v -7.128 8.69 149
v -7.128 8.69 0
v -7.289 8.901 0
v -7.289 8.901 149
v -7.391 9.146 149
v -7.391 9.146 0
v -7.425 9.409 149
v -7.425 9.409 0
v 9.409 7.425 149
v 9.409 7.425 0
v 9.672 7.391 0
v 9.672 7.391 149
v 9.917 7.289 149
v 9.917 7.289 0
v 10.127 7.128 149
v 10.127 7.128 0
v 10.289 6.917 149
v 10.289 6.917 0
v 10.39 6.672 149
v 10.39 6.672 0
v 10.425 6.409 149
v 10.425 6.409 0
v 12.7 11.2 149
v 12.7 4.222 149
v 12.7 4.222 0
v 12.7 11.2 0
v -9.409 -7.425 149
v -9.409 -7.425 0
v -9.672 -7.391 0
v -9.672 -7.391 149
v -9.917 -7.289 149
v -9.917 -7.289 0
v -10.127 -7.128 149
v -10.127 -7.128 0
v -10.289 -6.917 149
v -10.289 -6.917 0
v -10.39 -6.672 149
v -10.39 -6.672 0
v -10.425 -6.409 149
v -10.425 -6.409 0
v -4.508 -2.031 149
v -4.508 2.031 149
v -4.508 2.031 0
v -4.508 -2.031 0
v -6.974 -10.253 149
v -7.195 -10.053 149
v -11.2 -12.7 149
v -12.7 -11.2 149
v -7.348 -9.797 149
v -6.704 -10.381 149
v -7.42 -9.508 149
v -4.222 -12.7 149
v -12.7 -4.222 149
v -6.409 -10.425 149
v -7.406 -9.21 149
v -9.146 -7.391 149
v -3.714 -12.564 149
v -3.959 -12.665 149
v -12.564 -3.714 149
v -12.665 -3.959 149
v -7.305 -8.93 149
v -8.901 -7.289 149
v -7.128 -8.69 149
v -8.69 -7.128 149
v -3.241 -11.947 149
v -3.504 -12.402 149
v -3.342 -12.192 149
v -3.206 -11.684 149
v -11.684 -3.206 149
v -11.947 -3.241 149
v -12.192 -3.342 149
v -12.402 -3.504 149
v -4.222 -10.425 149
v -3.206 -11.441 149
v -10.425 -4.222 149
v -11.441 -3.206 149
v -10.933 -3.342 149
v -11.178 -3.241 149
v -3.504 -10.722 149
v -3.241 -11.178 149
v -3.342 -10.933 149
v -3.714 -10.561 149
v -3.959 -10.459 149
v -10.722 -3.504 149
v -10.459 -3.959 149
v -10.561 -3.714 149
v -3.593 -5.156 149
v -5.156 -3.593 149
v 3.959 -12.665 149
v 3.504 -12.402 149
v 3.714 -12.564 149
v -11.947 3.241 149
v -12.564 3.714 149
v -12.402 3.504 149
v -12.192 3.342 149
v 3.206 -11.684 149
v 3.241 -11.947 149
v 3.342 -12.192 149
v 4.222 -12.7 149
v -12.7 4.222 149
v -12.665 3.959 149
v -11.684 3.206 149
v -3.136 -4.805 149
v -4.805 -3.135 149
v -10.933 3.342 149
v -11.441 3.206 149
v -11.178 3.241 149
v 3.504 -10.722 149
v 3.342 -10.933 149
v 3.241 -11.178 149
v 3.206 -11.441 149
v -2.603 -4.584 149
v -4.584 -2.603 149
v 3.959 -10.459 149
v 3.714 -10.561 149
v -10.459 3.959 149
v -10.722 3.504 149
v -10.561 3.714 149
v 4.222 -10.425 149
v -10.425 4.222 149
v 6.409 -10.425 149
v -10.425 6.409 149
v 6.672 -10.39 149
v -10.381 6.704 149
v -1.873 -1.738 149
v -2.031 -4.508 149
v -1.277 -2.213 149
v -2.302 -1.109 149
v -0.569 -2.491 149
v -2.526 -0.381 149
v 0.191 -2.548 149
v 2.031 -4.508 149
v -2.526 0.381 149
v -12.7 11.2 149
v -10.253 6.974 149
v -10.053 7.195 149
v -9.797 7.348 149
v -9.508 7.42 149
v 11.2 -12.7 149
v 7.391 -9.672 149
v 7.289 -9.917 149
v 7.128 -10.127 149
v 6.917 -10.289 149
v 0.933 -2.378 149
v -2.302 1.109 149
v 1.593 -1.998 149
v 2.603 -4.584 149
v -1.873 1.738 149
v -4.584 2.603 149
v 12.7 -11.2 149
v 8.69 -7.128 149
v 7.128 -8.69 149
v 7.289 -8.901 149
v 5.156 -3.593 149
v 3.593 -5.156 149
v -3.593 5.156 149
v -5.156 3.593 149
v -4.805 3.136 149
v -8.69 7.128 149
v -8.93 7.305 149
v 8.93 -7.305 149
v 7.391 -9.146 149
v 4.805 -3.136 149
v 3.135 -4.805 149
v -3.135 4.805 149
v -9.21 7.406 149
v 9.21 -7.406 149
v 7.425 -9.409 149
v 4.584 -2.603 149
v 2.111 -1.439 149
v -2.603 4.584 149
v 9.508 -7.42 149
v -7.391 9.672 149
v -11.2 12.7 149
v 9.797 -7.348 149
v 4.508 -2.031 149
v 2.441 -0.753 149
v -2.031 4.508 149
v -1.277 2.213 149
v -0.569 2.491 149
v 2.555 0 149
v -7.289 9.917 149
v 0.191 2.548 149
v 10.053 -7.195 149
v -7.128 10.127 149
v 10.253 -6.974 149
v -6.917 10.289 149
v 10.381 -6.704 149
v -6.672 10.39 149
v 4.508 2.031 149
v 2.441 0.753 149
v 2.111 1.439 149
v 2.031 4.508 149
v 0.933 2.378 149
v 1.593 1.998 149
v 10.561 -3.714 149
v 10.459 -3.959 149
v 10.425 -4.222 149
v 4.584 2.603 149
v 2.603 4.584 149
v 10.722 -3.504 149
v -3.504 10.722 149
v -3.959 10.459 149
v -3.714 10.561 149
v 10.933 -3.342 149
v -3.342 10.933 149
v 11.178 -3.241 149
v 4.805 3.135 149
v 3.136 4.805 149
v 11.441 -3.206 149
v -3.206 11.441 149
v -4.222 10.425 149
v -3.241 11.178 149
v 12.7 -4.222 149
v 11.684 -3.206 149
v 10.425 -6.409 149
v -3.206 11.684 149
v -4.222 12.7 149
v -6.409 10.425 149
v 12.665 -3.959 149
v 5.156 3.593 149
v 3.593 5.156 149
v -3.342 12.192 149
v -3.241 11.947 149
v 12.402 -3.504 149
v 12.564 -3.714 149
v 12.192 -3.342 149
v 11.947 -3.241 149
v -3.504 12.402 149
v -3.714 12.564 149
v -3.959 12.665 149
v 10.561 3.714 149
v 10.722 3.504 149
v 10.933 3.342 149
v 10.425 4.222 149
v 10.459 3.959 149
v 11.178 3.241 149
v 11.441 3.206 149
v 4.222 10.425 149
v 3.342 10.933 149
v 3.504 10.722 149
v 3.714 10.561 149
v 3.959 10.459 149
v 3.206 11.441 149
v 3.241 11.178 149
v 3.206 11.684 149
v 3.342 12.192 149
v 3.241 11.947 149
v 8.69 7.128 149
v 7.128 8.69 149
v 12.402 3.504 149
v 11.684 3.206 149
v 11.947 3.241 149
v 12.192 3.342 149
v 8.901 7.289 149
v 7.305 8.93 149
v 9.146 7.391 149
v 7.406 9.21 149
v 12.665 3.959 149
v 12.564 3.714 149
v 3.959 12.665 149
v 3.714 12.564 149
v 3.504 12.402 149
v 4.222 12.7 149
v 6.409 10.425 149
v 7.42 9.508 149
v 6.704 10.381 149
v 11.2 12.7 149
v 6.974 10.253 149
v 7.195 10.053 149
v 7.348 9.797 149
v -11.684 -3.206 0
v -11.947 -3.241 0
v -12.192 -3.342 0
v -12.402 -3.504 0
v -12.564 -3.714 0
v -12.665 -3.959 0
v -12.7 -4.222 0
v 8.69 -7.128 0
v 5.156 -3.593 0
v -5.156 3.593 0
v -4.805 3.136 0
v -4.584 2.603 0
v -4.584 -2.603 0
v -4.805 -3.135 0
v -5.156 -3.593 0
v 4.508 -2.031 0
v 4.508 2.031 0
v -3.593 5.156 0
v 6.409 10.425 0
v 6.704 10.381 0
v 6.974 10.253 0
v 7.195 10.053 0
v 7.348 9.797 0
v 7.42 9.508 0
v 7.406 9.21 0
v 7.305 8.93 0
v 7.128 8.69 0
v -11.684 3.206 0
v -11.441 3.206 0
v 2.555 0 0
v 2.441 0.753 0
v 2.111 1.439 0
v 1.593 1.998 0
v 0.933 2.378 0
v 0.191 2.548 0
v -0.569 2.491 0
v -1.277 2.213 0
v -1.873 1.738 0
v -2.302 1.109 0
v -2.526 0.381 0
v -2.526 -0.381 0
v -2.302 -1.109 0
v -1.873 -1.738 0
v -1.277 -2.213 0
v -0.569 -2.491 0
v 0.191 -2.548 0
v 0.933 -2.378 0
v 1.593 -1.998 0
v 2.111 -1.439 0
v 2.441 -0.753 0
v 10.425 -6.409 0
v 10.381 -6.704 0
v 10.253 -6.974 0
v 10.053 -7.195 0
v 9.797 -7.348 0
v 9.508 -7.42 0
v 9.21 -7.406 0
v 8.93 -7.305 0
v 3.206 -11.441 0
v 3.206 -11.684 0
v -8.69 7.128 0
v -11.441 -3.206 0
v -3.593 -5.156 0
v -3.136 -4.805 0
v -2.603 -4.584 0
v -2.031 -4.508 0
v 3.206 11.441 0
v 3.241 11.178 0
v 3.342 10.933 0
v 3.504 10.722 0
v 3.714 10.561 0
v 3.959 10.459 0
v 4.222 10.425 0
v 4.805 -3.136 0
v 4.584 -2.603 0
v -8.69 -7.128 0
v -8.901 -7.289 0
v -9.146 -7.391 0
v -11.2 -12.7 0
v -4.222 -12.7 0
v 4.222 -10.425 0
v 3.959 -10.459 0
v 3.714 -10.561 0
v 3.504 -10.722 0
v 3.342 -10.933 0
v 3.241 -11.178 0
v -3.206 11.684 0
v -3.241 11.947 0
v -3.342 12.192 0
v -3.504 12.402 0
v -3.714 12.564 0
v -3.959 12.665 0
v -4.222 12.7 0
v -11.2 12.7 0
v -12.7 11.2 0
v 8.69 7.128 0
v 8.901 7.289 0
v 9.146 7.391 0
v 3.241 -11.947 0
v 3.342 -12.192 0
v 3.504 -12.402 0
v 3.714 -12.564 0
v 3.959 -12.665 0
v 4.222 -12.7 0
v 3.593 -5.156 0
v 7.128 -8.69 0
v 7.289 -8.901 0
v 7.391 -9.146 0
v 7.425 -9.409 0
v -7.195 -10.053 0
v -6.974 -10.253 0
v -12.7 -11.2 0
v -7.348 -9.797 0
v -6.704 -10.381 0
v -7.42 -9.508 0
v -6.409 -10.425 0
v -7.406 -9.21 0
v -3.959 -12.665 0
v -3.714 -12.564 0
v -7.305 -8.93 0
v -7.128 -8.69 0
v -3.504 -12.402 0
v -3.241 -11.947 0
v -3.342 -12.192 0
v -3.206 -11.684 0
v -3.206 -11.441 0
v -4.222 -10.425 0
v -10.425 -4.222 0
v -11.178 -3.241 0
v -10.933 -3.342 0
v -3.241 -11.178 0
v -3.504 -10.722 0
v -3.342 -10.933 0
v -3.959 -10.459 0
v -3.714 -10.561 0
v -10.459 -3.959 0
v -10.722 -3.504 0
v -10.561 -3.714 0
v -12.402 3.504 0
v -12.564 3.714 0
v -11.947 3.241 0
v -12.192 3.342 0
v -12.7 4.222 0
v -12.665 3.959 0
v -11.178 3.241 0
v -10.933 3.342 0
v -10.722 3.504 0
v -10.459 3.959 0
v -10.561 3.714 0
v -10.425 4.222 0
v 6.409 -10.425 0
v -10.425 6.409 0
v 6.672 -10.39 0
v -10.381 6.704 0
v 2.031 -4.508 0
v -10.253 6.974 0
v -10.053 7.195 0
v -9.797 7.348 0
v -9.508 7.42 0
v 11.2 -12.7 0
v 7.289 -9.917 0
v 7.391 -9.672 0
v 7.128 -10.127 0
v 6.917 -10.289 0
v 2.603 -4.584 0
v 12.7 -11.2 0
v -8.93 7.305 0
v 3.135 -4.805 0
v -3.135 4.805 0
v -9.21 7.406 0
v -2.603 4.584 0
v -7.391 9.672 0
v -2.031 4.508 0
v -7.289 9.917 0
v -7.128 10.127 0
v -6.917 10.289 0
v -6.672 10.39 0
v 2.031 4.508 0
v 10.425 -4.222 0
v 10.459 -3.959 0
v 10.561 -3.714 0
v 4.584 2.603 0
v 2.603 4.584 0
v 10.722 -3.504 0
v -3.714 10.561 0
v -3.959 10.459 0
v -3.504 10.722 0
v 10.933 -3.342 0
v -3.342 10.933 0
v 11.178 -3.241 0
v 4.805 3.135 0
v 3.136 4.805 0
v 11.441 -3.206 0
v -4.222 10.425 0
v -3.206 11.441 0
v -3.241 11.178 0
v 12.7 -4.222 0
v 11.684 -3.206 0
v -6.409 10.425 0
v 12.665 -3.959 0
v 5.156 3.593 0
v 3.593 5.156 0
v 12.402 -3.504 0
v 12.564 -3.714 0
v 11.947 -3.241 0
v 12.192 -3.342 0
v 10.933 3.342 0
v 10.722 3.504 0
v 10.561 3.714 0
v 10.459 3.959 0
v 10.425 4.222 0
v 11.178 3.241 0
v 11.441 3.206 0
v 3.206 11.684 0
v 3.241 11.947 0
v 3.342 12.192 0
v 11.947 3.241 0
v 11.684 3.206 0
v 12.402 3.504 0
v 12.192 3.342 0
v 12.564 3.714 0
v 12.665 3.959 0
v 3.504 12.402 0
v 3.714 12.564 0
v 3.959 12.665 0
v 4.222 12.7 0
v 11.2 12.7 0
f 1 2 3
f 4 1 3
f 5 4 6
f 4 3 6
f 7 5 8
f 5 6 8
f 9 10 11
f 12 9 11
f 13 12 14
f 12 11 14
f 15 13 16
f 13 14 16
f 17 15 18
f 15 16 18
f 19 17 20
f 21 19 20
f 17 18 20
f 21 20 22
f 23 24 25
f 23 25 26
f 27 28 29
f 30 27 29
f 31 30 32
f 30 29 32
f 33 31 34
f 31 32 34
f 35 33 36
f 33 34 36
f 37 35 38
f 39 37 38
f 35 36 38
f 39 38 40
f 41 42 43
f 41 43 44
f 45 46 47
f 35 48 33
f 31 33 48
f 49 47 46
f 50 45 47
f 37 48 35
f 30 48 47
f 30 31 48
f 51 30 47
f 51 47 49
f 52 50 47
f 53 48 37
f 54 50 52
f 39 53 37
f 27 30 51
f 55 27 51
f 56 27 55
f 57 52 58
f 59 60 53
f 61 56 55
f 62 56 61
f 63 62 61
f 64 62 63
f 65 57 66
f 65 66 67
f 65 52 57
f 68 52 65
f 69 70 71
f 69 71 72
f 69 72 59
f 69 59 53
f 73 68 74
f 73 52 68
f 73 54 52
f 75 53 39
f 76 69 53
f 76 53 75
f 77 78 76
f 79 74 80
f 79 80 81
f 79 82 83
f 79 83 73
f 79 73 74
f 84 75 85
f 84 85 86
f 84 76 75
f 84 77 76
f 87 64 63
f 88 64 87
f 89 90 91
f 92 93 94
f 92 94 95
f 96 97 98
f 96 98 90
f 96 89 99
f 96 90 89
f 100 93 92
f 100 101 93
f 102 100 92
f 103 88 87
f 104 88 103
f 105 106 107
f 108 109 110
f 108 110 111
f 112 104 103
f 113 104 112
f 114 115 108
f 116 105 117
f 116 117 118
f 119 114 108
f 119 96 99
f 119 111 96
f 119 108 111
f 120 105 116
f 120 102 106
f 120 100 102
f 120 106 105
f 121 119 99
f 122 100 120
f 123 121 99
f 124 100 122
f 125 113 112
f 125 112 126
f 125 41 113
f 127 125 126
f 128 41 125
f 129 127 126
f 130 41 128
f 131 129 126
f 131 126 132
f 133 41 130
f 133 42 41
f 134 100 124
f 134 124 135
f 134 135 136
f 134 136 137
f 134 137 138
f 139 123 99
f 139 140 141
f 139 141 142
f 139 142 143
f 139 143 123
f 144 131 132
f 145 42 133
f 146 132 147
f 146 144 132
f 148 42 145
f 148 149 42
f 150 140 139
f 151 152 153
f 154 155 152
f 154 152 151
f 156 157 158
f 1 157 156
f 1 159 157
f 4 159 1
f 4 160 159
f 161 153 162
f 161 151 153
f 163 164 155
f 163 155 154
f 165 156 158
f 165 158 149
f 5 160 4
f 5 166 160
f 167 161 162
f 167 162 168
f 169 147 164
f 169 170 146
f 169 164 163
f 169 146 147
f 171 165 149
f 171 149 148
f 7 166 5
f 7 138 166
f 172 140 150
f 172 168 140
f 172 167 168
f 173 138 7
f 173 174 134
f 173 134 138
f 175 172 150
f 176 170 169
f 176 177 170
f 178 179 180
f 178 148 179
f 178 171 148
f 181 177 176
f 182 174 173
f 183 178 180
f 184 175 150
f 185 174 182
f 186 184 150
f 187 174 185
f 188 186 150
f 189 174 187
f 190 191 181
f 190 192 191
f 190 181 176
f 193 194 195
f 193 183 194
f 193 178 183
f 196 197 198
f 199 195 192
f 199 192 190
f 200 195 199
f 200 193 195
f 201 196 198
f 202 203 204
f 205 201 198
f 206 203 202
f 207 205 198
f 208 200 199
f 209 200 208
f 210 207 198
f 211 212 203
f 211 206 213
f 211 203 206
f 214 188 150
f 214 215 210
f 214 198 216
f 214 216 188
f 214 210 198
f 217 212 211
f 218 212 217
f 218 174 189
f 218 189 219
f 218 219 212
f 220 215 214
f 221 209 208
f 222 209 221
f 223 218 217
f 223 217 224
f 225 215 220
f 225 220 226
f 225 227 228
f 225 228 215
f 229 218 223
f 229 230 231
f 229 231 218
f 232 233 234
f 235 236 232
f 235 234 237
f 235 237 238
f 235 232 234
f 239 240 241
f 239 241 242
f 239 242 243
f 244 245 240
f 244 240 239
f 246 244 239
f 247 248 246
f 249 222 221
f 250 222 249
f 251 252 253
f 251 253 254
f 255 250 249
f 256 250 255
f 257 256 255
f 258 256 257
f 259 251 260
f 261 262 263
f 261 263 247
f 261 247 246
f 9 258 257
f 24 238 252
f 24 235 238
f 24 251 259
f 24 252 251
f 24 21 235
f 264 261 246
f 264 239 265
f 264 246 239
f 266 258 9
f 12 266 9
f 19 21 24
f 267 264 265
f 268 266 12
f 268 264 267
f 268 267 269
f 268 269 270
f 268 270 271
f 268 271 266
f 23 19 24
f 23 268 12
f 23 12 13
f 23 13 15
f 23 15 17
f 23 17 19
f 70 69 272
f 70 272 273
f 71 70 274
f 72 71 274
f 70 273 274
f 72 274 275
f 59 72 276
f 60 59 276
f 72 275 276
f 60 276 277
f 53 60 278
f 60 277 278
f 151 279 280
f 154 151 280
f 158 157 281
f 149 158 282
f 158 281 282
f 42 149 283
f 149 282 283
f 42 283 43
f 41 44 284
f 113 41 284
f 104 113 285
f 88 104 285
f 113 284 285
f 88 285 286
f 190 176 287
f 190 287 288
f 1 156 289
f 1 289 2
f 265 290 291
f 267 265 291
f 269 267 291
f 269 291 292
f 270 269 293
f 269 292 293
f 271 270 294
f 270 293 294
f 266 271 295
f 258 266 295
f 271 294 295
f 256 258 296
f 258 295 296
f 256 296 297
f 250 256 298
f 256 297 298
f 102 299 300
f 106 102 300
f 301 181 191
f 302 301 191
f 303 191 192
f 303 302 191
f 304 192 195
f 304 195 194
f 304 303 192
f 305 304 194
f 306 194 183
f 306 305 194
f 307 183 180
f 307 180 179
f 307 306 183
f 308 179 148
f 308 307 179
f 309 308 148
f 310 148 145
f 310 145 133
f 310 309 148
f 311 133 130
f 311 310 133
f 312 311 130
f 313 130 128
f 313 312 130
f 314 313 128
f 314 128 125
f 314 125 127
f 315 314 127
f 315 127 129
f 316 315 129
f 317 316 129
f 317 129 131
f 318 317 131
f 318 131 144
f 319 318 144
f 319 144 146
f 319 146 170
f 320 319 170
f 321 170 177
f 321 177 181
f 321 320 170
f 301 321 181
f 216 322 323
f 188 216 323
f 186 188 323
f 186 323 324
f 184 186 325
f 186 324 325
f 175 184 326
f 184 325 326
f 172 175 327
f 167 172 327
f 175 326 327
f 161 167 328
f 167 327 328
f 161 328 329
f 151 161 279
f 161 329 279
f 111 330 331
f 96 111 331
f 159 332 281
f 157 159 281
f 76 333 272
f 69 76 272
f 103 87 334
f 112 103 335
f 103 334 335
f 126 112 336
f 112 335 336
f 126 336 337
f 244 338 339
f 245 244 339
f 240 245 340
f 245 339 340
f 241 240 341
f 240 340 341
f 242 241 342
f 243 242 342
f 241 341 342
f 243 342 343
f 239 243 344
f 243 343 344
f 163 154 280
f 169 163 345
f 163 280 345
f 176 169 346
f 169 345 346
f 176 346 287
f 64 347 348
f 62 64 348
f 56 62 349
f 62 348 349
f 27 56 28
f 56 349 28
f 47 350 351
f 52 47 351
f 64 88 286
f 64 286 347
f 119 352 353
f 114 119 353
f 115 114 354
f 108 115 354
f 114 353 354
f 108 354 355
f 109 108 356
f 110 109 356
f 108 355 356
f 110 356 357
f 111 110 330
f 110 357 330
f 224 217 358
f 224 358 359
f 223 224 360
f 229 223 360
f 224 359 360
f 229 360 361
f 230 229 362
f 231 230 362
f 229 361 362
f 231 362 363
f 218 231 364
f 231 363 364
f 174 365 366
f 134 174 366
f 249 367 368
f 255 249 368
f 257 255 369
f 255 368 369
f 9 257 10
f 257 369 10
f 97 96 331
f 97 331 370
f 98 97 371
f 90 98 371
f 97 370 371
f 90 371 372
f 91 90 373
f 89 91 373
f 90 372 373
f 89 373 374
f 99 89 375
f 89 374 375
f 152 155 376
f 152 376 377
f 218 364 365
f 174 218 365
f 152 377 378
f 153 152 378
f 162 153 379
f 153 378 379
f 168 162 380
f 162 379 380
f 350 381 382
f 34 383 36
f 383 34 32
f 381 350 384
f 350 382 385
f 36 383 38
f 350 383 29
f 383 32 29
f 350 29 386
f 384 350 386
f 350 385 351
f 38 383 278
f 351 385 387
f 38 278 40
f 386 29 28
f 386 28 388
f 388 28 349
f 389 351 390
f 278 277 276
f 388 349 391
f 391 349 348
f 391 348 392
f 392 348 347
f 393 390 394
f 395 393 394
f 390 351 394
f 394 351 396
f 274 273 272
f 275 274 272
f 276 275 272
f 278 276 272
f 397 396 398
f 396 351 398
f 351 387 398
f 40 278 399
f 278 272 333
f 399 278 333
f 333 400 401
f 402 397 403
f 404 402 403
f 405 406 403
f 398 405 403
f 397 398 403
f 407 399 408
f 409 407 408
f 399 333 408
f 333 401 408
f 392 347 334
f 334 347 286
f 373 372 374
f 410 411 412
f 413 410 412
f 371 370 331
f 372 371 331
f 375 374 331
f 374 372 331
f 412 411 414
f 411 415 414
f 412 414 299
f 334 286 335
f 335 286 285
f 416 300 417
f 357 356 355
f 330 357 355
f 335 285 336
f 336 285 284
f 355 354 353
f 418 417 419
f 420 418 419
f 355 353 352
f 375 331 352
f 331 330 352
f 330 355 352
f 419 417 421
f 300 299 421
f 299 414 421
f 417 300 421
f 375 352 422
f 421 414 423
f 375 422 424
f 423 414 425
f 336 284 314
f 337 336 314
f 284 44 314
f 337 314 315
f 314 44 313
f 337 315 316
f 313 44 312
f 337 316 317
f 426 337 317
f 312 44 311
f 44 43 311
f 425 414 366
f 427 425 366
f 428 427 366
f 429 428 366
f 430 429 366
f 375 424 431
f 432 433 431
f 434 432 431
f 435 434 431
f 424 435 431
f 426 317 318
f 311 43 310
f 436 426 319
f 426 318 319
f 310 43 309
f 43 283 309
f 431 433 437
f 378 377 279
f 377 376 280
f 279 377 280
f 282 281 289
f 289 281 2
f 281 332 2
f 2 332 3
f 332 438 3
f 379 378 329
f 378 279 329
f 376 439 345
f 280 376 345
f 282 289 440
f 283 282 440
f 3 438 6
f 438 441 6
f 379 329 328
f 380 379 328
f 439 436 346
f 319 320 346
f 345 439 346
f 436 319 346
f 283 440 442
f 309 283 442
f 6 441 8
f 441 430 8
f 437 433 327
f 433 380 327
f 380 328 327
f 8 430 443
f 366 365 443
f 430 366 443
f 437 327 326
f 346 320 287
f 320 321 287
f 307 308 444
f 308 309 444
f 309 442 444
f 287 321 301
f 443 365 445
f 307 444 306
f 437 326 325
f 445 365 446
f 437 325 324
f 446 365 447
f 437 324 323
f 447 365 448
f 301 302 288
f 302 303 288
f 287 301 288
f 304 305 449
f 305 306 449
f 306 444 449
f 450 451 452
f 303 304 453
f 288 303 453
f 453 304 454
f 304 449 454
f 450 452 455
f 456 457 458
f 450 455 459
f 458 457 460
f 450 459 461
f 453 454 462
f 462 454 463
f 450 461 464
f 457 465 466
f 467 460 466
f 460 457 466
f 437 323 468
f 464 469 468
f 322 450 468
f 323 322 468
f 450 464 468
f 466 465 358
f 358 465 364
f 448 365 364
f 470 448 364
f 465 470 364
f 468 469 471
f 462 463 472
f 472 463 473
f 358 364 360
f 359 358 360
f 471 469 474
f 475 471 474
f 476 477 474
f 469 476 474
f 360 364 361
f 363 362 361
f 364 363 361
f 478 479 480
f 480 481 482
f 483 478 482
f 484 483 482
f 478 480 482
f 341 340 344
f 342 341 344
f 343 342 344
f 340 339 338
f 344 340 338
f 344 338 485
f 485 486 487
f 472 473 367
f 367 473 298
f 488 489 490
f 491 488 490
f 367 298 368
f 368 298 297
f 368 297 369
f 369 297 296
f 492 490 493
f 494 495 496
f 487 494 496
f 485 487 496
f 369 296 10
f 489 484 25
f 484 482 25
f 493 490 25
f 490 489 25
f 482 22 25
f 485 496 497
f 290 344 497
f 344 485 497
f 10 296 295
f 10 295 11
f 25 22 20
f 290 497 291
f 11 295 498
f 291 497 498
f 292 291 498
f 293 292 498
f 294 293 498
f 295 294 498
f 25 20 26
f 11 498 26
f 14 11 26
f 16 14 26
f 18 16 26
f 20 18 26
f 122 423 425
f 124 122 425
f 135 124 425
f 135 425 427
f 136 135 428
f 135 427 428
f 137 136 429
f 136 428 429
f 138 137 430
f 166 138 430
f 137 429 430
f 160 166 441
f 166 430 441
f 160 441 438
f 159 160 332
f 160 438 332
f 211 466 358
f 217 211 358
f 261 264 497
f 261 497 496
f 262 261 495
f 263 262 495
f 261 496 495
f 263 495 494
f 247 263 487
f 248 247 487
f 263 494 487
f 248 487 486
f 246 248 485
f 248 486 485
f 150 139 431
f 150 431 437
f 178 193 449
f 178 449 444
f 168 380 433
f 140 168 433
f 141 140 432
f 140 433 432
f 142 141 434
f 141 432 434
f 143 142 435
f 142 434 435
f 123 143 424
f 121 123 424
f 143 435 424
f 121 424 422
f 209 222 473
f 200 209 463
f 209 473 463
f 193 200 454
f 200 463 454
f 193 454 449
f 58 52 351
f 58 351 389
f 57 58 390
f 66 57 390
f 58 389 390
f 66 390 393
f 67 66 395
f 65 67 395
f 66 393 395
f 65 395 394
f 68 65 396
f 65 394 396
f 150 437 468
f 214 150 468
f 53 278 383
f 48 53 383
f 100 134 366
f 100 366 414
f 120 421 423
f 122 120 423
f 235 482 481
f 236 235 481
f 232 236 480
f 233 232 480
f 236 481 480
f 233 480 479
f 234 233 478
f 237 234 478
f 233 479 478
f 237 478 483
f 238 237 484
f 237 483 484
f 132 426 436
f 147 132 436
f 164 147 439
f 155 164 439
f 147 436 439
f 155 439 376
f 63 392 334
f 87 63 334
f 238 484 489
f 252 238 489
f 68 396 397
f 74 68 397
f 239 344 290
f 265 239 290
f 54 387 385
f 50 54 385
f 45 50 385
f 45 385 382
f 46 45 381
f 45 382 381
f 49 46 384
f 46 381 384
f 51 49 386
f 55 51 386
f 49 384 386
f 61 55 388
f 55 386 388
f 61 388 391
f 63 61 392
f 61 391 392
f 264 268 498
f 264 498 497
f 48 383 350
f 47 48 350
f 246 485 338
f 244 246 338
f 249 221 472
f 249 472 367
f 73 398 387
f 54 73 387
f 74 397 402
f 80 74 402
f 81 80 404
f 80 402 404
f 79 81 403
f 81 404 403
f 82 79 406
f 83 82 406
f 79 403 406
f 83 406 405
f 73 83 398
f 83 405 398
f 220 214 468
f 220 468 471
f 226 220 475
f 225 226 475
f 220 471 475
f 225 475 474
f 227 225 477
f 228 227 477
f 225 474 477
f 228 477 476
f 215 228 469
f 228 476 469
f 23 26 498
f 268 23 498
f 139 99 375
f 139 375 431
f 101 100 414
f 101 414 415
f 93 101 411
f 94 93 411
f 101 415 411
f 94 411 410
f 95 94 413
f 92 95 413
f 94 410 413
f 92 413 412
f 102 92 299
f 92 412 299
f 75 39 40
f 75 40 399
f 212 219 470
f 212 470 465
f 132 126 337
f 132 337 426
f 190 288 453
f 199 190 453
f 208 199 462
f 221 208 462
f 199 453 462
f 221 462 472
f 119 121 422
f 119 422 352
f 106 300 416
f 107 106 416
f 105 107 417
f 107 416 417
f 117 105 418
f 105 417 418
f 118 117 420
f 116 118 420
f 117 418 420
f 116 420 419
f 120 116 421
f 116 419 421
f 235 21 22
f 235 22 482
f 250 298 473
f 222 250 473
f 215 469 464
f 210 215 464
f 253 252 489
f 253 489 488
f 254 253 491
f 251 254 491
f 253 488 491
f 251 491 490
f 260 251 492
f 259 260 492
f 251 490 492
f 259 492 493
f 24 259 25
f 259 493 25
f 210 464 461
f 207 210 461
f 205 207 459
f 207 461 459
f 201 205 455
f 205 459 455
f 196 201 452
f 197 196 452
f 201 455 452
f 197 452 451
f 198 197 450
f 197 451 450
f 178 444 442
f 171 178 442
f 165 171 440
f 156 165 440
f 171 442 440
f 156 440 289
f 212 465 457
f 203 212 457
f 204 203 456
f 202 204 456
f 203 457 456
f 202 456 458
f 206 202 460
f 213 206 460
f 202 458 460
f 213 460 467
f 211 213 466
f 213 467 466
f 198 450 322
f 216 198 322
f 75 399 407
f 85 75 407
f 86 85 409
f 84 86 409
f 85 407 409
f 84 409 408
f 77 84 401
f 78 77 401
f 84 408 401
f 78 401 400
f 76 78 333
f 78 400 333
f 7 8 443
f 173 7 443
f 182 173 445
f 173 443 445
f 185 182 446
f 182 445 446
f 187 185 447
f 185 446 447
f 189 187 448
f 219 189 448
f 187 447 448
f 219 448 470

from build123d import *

# Parameters (mm, degrees)
BOSS_EXTRUDE1_DEPTH = 149


with BuildPart() as part:
    # Sketch1 → Boss-Extrude1 (new body)
    with BuildSketch(Plane.XY):
        with BuildLine():
            Line((-11.199951579, -12.7), (-4.222256762, -12.7))
            ThreePointArc((-4.222256762, -12.7), (-3.503836272, -12.40242049), (-3.206256762, -11.684))
            Line((-3.206256762, -11.684), (-3.206256762, -11.440665395))
            ThreePointArc((-3.206256762, -11.440665395), (-3.503836272, -10.722244905), (-4.222256762, -10.424665395))
            Line((-4.222256762, -10.424665395), (-6.40926672, -10.424665395))
            ThreePointArc((-6.40926672, -10.424665395), (-7.347928334, -9.797471742), (-7.127687178, -8.690244874))
            Line((-7.127687178, -8.690244874), (-3.593166694, -5.155724698))
            ThreePointArc((-3.593166694, -5.155724698), (-2.876257435, -4.67670128), (-2.030605322, -4.508490626))
            Line((-2.030605322, -4.508490626), (2.030598864, -4.508490626))
            ThreePointArc((2.030598864, -4.508490626), (2.876251031, -4.676701303), (3.593160319, -5.155724782))
            Line((3.593160319, -5.155724782), (7.127680379, -8.690244912))
            ThreePointArc((7.127680379, -8.690244912), (7.347921489, -9.019859032), (7.425259882, -9.408665395))
            ThreePointArc((7.425259882, -9.408665395), (7.127680372, -10.127085884), (6.409259882, -10.424665395))
            Line((6.409259882, -10.424665395), (4.22225065, -10.424665395))
            ThreePointArc((4.22225065, -10.424665395), (3.50383016, -10.722244905), (3.20625065, -11.440665395))
            Line((3.20625065, -11.440665395), (3.20625065, -11.684))
            ThreePointArc((3.20625065, -11.684), (3.50383016, -12.40242049), (4.22225065, -12.7))
            Line((4.22225065, -12.7), (11.199952422, -12.7))
            Line((11.199952422, -12.7), (12.7, -11.199951732))
            Line((12.7, -11.199951732), (12.7, -4.222256762))
            ThreePointArc((12.7, -4.222256762), (12.40242049, -3.503836272), (11.684, -3.206256762))
            Line((11.684, -3.206256762), (11.440665395, -3.206256762))
            ThreePointArc((11.440665395, -3.206256762), (10.722244905, -3.503836272), (10.424665395, -4.222256762))
            Line((10.424665395, -4.222256762), (10.424665395, -6.40926672))
            ThreePointArc((10.424665395, -6.40926672), (9.797471742, -7.347928334), (8.690244874, -7.127687178))
            Line((8.690244874, -7.127687178), (5.155724698, -3.593166694))
            ThreePointArc((5.155724698, -3.593166694), (4.67670128, -2.876257435), (4.508490626, -2.030605322))
            Line((4.508490626, -2.030605322), (4.508490626, 2.030598864))
            ThreePointArc((4.508490626, 2.030598864), (4.676701303, 2.876251031), (5.155724782, 3.593160319))
            Line((5.155724782, 3.593160319), (8.690244912, 7.127680379))
            ThreePointArc((8.690244912, 7.127680379), (9.019859032, 7.347921489), (9.408665395, 7.425259882))
            ThreePointArc((9.408665395, 7.425259882), (10.127085884, 7.127680372), (10.424665395, 6.409259882))
            Line((10.424665395, 6.409259882), (10.424665395, 4.22225065))
            ThreePointArc((10.424665395, 4.22225065), (10.722244905, 3.50383016), (11.440665395, 3.20625065))
            Line((11.440665395, 3.20625065), (11.684, 3.20625065))
            ThreePointArc((11.684, 3.20625065), (12.40242049, 3.50383016), (12.7, 4.22225065))
            Line((12.7, 4.22225065), (12.7, 11.199954756))
            Line((12.7, 11.199954756), (11.199954423, 12.7))
            Line((11.199954423, 12.7), (4.222256762, 12.7))
            ThreePointArc((4.222256762, 12.7), (3.503836272, 12.40242049), (3.206256762, 11.684))
            Line((3.206256762, 11.684), (3.206256762, 11.440665395))
            ThreePointArc((3.206256762, 11.440665395), (3.503836272, 10.722244905), (4.222256762, 10.424665395))
            Line((4.222256762, 10.424665395), (6.40926672, 10.424665395))
            ThreePointArc((6.40926672, 10.424665395), (7.347928334, 9.797471742), (7.127687178, 8.690244874))
            Line((7.127687178, 8.690244874), (3.593166694, 5.155724698))
            ThreePointArc((3.593166694, 5.155724698), (2.876257435, 4.67670128), (2.030605322, 4.508490626))
            Line((2.030605322, 4.508490626), (-2.030598864, 4.508490626))
            ThreePointArc((-2.030598864, 4.508490626), (-2.876251031, 4.676701303), (-3.593160319, 5.155724782))
            Line((-3.593160319, 5.155724782), (-7.127680379, 8.690244912))
            ThreePointArc((-7.127680379, 8.690244912), (-7.347921489, 9.019859032), (-7.425259882, 9.408665395))
            ThreePointArc((-7.425259882, 9.408665395), (-7.127680372, 10.127085884), (-6.409259882, 10.424665395))
            Line((-6.409259882, 10.424665395), (-4.22225065, 10.424665395))
            ThreePointArc((-4.22225065, 10.424665395), (-3.50383016, 10.722244905), (-3.20625065, 11.440665395))
            Line((-3.20625065, 11.440665395), (-3.20625065, 11.684))
            ThreePointArc((-3.20625065, 11.684), (-3.50383016, 12.40242049), (-4.22225065, 12.7))
            Line((-4.22225065, 12.7), (-11.199951733, 12.7))
            Line((-11.199951733, 12.7), (-12.7, 11.1999514))
            Line((-12.7, 11.1999514), (-12.7, 4.222256762))
            ThreePointArc((-12.7, 4.222256762), (-12.40242049, 3.503836272), (-11.684, 3.206256762))
            Line((-11.684, 3.206256762), (-11.440665395, 3.206256762))
            ThreePointArc((-11.440665395, 3.206256762), (-10.722244905, 3.503836272), (-10.424665395, 4.222256762))
            Line((-10.424665395, 4.222256762), (-10.424665395, 6.40926672))
            ThreePointArc((-10.424665395, 6.40926672), (-9.797471742, 7.347928334), (-8.690244874, 7.127687178))
            Line((-8.690244874, 7.127687178), (-5.155724698, 3.593166694))
            ThreePointArc((-5.155724698, 3.593166694), (-4.67670128, 2.876257435), (-4.508490626, 2.030605322))
            Line((-4.508490626, 2.030605322), (-4.508490626, -2.030598864))
            ThreePointArc((-4.508490626, -2.030598864), (-4.676701303, -2.876251031), (-5.155724782, -3.593160319))
            Line((-5.155724782, -3.593160319), (-8.690244912, -7.127680379))
            ThreePointArc((-8.690244912, -7.127680379), (-9.019859032, -7.347921489), (-9.408665395, -7.425259882))
            ThreePointArc((-9.408665395, -7.425259882), (-10.127085884, -7.127680372), (-10.424665395, -6.409259882))
            Line((-10.424665395, -6.409259882), (-10.424665395, -4.22225065))
            ThreePointArc((-10.424665395, -4.22225065), (-10.722244905, -3.50383016), (-11.440665395, -3.20625065))
            Line((-11.440665395, -3.20625065), (-11.684, -3.20625065))
            ThreePointArc((-11.684, -3.20625065), (-12.40242049, -3.50383016), (-12.7, -4.22225065))
            Line((-12.7, -4.22225065), (-12.7, -11.199952268))
            Line((-12.7, -11.199952268), (-11.199951579, -12.7))
        make_face()
        with BuildLine():
            ThreePointArc((-2.55499489, 0), (0, -2.55499489), (2.55499489, 0))
            ThreePointArc((2.55499489, 0), (0, 2.55499489), (-2.55499489, 0))
        make_face(mode=Mode.SUBTRACT)
    extrude(amount=BOSS_EXTRUDE1_DEPTH)


solid = part.part
